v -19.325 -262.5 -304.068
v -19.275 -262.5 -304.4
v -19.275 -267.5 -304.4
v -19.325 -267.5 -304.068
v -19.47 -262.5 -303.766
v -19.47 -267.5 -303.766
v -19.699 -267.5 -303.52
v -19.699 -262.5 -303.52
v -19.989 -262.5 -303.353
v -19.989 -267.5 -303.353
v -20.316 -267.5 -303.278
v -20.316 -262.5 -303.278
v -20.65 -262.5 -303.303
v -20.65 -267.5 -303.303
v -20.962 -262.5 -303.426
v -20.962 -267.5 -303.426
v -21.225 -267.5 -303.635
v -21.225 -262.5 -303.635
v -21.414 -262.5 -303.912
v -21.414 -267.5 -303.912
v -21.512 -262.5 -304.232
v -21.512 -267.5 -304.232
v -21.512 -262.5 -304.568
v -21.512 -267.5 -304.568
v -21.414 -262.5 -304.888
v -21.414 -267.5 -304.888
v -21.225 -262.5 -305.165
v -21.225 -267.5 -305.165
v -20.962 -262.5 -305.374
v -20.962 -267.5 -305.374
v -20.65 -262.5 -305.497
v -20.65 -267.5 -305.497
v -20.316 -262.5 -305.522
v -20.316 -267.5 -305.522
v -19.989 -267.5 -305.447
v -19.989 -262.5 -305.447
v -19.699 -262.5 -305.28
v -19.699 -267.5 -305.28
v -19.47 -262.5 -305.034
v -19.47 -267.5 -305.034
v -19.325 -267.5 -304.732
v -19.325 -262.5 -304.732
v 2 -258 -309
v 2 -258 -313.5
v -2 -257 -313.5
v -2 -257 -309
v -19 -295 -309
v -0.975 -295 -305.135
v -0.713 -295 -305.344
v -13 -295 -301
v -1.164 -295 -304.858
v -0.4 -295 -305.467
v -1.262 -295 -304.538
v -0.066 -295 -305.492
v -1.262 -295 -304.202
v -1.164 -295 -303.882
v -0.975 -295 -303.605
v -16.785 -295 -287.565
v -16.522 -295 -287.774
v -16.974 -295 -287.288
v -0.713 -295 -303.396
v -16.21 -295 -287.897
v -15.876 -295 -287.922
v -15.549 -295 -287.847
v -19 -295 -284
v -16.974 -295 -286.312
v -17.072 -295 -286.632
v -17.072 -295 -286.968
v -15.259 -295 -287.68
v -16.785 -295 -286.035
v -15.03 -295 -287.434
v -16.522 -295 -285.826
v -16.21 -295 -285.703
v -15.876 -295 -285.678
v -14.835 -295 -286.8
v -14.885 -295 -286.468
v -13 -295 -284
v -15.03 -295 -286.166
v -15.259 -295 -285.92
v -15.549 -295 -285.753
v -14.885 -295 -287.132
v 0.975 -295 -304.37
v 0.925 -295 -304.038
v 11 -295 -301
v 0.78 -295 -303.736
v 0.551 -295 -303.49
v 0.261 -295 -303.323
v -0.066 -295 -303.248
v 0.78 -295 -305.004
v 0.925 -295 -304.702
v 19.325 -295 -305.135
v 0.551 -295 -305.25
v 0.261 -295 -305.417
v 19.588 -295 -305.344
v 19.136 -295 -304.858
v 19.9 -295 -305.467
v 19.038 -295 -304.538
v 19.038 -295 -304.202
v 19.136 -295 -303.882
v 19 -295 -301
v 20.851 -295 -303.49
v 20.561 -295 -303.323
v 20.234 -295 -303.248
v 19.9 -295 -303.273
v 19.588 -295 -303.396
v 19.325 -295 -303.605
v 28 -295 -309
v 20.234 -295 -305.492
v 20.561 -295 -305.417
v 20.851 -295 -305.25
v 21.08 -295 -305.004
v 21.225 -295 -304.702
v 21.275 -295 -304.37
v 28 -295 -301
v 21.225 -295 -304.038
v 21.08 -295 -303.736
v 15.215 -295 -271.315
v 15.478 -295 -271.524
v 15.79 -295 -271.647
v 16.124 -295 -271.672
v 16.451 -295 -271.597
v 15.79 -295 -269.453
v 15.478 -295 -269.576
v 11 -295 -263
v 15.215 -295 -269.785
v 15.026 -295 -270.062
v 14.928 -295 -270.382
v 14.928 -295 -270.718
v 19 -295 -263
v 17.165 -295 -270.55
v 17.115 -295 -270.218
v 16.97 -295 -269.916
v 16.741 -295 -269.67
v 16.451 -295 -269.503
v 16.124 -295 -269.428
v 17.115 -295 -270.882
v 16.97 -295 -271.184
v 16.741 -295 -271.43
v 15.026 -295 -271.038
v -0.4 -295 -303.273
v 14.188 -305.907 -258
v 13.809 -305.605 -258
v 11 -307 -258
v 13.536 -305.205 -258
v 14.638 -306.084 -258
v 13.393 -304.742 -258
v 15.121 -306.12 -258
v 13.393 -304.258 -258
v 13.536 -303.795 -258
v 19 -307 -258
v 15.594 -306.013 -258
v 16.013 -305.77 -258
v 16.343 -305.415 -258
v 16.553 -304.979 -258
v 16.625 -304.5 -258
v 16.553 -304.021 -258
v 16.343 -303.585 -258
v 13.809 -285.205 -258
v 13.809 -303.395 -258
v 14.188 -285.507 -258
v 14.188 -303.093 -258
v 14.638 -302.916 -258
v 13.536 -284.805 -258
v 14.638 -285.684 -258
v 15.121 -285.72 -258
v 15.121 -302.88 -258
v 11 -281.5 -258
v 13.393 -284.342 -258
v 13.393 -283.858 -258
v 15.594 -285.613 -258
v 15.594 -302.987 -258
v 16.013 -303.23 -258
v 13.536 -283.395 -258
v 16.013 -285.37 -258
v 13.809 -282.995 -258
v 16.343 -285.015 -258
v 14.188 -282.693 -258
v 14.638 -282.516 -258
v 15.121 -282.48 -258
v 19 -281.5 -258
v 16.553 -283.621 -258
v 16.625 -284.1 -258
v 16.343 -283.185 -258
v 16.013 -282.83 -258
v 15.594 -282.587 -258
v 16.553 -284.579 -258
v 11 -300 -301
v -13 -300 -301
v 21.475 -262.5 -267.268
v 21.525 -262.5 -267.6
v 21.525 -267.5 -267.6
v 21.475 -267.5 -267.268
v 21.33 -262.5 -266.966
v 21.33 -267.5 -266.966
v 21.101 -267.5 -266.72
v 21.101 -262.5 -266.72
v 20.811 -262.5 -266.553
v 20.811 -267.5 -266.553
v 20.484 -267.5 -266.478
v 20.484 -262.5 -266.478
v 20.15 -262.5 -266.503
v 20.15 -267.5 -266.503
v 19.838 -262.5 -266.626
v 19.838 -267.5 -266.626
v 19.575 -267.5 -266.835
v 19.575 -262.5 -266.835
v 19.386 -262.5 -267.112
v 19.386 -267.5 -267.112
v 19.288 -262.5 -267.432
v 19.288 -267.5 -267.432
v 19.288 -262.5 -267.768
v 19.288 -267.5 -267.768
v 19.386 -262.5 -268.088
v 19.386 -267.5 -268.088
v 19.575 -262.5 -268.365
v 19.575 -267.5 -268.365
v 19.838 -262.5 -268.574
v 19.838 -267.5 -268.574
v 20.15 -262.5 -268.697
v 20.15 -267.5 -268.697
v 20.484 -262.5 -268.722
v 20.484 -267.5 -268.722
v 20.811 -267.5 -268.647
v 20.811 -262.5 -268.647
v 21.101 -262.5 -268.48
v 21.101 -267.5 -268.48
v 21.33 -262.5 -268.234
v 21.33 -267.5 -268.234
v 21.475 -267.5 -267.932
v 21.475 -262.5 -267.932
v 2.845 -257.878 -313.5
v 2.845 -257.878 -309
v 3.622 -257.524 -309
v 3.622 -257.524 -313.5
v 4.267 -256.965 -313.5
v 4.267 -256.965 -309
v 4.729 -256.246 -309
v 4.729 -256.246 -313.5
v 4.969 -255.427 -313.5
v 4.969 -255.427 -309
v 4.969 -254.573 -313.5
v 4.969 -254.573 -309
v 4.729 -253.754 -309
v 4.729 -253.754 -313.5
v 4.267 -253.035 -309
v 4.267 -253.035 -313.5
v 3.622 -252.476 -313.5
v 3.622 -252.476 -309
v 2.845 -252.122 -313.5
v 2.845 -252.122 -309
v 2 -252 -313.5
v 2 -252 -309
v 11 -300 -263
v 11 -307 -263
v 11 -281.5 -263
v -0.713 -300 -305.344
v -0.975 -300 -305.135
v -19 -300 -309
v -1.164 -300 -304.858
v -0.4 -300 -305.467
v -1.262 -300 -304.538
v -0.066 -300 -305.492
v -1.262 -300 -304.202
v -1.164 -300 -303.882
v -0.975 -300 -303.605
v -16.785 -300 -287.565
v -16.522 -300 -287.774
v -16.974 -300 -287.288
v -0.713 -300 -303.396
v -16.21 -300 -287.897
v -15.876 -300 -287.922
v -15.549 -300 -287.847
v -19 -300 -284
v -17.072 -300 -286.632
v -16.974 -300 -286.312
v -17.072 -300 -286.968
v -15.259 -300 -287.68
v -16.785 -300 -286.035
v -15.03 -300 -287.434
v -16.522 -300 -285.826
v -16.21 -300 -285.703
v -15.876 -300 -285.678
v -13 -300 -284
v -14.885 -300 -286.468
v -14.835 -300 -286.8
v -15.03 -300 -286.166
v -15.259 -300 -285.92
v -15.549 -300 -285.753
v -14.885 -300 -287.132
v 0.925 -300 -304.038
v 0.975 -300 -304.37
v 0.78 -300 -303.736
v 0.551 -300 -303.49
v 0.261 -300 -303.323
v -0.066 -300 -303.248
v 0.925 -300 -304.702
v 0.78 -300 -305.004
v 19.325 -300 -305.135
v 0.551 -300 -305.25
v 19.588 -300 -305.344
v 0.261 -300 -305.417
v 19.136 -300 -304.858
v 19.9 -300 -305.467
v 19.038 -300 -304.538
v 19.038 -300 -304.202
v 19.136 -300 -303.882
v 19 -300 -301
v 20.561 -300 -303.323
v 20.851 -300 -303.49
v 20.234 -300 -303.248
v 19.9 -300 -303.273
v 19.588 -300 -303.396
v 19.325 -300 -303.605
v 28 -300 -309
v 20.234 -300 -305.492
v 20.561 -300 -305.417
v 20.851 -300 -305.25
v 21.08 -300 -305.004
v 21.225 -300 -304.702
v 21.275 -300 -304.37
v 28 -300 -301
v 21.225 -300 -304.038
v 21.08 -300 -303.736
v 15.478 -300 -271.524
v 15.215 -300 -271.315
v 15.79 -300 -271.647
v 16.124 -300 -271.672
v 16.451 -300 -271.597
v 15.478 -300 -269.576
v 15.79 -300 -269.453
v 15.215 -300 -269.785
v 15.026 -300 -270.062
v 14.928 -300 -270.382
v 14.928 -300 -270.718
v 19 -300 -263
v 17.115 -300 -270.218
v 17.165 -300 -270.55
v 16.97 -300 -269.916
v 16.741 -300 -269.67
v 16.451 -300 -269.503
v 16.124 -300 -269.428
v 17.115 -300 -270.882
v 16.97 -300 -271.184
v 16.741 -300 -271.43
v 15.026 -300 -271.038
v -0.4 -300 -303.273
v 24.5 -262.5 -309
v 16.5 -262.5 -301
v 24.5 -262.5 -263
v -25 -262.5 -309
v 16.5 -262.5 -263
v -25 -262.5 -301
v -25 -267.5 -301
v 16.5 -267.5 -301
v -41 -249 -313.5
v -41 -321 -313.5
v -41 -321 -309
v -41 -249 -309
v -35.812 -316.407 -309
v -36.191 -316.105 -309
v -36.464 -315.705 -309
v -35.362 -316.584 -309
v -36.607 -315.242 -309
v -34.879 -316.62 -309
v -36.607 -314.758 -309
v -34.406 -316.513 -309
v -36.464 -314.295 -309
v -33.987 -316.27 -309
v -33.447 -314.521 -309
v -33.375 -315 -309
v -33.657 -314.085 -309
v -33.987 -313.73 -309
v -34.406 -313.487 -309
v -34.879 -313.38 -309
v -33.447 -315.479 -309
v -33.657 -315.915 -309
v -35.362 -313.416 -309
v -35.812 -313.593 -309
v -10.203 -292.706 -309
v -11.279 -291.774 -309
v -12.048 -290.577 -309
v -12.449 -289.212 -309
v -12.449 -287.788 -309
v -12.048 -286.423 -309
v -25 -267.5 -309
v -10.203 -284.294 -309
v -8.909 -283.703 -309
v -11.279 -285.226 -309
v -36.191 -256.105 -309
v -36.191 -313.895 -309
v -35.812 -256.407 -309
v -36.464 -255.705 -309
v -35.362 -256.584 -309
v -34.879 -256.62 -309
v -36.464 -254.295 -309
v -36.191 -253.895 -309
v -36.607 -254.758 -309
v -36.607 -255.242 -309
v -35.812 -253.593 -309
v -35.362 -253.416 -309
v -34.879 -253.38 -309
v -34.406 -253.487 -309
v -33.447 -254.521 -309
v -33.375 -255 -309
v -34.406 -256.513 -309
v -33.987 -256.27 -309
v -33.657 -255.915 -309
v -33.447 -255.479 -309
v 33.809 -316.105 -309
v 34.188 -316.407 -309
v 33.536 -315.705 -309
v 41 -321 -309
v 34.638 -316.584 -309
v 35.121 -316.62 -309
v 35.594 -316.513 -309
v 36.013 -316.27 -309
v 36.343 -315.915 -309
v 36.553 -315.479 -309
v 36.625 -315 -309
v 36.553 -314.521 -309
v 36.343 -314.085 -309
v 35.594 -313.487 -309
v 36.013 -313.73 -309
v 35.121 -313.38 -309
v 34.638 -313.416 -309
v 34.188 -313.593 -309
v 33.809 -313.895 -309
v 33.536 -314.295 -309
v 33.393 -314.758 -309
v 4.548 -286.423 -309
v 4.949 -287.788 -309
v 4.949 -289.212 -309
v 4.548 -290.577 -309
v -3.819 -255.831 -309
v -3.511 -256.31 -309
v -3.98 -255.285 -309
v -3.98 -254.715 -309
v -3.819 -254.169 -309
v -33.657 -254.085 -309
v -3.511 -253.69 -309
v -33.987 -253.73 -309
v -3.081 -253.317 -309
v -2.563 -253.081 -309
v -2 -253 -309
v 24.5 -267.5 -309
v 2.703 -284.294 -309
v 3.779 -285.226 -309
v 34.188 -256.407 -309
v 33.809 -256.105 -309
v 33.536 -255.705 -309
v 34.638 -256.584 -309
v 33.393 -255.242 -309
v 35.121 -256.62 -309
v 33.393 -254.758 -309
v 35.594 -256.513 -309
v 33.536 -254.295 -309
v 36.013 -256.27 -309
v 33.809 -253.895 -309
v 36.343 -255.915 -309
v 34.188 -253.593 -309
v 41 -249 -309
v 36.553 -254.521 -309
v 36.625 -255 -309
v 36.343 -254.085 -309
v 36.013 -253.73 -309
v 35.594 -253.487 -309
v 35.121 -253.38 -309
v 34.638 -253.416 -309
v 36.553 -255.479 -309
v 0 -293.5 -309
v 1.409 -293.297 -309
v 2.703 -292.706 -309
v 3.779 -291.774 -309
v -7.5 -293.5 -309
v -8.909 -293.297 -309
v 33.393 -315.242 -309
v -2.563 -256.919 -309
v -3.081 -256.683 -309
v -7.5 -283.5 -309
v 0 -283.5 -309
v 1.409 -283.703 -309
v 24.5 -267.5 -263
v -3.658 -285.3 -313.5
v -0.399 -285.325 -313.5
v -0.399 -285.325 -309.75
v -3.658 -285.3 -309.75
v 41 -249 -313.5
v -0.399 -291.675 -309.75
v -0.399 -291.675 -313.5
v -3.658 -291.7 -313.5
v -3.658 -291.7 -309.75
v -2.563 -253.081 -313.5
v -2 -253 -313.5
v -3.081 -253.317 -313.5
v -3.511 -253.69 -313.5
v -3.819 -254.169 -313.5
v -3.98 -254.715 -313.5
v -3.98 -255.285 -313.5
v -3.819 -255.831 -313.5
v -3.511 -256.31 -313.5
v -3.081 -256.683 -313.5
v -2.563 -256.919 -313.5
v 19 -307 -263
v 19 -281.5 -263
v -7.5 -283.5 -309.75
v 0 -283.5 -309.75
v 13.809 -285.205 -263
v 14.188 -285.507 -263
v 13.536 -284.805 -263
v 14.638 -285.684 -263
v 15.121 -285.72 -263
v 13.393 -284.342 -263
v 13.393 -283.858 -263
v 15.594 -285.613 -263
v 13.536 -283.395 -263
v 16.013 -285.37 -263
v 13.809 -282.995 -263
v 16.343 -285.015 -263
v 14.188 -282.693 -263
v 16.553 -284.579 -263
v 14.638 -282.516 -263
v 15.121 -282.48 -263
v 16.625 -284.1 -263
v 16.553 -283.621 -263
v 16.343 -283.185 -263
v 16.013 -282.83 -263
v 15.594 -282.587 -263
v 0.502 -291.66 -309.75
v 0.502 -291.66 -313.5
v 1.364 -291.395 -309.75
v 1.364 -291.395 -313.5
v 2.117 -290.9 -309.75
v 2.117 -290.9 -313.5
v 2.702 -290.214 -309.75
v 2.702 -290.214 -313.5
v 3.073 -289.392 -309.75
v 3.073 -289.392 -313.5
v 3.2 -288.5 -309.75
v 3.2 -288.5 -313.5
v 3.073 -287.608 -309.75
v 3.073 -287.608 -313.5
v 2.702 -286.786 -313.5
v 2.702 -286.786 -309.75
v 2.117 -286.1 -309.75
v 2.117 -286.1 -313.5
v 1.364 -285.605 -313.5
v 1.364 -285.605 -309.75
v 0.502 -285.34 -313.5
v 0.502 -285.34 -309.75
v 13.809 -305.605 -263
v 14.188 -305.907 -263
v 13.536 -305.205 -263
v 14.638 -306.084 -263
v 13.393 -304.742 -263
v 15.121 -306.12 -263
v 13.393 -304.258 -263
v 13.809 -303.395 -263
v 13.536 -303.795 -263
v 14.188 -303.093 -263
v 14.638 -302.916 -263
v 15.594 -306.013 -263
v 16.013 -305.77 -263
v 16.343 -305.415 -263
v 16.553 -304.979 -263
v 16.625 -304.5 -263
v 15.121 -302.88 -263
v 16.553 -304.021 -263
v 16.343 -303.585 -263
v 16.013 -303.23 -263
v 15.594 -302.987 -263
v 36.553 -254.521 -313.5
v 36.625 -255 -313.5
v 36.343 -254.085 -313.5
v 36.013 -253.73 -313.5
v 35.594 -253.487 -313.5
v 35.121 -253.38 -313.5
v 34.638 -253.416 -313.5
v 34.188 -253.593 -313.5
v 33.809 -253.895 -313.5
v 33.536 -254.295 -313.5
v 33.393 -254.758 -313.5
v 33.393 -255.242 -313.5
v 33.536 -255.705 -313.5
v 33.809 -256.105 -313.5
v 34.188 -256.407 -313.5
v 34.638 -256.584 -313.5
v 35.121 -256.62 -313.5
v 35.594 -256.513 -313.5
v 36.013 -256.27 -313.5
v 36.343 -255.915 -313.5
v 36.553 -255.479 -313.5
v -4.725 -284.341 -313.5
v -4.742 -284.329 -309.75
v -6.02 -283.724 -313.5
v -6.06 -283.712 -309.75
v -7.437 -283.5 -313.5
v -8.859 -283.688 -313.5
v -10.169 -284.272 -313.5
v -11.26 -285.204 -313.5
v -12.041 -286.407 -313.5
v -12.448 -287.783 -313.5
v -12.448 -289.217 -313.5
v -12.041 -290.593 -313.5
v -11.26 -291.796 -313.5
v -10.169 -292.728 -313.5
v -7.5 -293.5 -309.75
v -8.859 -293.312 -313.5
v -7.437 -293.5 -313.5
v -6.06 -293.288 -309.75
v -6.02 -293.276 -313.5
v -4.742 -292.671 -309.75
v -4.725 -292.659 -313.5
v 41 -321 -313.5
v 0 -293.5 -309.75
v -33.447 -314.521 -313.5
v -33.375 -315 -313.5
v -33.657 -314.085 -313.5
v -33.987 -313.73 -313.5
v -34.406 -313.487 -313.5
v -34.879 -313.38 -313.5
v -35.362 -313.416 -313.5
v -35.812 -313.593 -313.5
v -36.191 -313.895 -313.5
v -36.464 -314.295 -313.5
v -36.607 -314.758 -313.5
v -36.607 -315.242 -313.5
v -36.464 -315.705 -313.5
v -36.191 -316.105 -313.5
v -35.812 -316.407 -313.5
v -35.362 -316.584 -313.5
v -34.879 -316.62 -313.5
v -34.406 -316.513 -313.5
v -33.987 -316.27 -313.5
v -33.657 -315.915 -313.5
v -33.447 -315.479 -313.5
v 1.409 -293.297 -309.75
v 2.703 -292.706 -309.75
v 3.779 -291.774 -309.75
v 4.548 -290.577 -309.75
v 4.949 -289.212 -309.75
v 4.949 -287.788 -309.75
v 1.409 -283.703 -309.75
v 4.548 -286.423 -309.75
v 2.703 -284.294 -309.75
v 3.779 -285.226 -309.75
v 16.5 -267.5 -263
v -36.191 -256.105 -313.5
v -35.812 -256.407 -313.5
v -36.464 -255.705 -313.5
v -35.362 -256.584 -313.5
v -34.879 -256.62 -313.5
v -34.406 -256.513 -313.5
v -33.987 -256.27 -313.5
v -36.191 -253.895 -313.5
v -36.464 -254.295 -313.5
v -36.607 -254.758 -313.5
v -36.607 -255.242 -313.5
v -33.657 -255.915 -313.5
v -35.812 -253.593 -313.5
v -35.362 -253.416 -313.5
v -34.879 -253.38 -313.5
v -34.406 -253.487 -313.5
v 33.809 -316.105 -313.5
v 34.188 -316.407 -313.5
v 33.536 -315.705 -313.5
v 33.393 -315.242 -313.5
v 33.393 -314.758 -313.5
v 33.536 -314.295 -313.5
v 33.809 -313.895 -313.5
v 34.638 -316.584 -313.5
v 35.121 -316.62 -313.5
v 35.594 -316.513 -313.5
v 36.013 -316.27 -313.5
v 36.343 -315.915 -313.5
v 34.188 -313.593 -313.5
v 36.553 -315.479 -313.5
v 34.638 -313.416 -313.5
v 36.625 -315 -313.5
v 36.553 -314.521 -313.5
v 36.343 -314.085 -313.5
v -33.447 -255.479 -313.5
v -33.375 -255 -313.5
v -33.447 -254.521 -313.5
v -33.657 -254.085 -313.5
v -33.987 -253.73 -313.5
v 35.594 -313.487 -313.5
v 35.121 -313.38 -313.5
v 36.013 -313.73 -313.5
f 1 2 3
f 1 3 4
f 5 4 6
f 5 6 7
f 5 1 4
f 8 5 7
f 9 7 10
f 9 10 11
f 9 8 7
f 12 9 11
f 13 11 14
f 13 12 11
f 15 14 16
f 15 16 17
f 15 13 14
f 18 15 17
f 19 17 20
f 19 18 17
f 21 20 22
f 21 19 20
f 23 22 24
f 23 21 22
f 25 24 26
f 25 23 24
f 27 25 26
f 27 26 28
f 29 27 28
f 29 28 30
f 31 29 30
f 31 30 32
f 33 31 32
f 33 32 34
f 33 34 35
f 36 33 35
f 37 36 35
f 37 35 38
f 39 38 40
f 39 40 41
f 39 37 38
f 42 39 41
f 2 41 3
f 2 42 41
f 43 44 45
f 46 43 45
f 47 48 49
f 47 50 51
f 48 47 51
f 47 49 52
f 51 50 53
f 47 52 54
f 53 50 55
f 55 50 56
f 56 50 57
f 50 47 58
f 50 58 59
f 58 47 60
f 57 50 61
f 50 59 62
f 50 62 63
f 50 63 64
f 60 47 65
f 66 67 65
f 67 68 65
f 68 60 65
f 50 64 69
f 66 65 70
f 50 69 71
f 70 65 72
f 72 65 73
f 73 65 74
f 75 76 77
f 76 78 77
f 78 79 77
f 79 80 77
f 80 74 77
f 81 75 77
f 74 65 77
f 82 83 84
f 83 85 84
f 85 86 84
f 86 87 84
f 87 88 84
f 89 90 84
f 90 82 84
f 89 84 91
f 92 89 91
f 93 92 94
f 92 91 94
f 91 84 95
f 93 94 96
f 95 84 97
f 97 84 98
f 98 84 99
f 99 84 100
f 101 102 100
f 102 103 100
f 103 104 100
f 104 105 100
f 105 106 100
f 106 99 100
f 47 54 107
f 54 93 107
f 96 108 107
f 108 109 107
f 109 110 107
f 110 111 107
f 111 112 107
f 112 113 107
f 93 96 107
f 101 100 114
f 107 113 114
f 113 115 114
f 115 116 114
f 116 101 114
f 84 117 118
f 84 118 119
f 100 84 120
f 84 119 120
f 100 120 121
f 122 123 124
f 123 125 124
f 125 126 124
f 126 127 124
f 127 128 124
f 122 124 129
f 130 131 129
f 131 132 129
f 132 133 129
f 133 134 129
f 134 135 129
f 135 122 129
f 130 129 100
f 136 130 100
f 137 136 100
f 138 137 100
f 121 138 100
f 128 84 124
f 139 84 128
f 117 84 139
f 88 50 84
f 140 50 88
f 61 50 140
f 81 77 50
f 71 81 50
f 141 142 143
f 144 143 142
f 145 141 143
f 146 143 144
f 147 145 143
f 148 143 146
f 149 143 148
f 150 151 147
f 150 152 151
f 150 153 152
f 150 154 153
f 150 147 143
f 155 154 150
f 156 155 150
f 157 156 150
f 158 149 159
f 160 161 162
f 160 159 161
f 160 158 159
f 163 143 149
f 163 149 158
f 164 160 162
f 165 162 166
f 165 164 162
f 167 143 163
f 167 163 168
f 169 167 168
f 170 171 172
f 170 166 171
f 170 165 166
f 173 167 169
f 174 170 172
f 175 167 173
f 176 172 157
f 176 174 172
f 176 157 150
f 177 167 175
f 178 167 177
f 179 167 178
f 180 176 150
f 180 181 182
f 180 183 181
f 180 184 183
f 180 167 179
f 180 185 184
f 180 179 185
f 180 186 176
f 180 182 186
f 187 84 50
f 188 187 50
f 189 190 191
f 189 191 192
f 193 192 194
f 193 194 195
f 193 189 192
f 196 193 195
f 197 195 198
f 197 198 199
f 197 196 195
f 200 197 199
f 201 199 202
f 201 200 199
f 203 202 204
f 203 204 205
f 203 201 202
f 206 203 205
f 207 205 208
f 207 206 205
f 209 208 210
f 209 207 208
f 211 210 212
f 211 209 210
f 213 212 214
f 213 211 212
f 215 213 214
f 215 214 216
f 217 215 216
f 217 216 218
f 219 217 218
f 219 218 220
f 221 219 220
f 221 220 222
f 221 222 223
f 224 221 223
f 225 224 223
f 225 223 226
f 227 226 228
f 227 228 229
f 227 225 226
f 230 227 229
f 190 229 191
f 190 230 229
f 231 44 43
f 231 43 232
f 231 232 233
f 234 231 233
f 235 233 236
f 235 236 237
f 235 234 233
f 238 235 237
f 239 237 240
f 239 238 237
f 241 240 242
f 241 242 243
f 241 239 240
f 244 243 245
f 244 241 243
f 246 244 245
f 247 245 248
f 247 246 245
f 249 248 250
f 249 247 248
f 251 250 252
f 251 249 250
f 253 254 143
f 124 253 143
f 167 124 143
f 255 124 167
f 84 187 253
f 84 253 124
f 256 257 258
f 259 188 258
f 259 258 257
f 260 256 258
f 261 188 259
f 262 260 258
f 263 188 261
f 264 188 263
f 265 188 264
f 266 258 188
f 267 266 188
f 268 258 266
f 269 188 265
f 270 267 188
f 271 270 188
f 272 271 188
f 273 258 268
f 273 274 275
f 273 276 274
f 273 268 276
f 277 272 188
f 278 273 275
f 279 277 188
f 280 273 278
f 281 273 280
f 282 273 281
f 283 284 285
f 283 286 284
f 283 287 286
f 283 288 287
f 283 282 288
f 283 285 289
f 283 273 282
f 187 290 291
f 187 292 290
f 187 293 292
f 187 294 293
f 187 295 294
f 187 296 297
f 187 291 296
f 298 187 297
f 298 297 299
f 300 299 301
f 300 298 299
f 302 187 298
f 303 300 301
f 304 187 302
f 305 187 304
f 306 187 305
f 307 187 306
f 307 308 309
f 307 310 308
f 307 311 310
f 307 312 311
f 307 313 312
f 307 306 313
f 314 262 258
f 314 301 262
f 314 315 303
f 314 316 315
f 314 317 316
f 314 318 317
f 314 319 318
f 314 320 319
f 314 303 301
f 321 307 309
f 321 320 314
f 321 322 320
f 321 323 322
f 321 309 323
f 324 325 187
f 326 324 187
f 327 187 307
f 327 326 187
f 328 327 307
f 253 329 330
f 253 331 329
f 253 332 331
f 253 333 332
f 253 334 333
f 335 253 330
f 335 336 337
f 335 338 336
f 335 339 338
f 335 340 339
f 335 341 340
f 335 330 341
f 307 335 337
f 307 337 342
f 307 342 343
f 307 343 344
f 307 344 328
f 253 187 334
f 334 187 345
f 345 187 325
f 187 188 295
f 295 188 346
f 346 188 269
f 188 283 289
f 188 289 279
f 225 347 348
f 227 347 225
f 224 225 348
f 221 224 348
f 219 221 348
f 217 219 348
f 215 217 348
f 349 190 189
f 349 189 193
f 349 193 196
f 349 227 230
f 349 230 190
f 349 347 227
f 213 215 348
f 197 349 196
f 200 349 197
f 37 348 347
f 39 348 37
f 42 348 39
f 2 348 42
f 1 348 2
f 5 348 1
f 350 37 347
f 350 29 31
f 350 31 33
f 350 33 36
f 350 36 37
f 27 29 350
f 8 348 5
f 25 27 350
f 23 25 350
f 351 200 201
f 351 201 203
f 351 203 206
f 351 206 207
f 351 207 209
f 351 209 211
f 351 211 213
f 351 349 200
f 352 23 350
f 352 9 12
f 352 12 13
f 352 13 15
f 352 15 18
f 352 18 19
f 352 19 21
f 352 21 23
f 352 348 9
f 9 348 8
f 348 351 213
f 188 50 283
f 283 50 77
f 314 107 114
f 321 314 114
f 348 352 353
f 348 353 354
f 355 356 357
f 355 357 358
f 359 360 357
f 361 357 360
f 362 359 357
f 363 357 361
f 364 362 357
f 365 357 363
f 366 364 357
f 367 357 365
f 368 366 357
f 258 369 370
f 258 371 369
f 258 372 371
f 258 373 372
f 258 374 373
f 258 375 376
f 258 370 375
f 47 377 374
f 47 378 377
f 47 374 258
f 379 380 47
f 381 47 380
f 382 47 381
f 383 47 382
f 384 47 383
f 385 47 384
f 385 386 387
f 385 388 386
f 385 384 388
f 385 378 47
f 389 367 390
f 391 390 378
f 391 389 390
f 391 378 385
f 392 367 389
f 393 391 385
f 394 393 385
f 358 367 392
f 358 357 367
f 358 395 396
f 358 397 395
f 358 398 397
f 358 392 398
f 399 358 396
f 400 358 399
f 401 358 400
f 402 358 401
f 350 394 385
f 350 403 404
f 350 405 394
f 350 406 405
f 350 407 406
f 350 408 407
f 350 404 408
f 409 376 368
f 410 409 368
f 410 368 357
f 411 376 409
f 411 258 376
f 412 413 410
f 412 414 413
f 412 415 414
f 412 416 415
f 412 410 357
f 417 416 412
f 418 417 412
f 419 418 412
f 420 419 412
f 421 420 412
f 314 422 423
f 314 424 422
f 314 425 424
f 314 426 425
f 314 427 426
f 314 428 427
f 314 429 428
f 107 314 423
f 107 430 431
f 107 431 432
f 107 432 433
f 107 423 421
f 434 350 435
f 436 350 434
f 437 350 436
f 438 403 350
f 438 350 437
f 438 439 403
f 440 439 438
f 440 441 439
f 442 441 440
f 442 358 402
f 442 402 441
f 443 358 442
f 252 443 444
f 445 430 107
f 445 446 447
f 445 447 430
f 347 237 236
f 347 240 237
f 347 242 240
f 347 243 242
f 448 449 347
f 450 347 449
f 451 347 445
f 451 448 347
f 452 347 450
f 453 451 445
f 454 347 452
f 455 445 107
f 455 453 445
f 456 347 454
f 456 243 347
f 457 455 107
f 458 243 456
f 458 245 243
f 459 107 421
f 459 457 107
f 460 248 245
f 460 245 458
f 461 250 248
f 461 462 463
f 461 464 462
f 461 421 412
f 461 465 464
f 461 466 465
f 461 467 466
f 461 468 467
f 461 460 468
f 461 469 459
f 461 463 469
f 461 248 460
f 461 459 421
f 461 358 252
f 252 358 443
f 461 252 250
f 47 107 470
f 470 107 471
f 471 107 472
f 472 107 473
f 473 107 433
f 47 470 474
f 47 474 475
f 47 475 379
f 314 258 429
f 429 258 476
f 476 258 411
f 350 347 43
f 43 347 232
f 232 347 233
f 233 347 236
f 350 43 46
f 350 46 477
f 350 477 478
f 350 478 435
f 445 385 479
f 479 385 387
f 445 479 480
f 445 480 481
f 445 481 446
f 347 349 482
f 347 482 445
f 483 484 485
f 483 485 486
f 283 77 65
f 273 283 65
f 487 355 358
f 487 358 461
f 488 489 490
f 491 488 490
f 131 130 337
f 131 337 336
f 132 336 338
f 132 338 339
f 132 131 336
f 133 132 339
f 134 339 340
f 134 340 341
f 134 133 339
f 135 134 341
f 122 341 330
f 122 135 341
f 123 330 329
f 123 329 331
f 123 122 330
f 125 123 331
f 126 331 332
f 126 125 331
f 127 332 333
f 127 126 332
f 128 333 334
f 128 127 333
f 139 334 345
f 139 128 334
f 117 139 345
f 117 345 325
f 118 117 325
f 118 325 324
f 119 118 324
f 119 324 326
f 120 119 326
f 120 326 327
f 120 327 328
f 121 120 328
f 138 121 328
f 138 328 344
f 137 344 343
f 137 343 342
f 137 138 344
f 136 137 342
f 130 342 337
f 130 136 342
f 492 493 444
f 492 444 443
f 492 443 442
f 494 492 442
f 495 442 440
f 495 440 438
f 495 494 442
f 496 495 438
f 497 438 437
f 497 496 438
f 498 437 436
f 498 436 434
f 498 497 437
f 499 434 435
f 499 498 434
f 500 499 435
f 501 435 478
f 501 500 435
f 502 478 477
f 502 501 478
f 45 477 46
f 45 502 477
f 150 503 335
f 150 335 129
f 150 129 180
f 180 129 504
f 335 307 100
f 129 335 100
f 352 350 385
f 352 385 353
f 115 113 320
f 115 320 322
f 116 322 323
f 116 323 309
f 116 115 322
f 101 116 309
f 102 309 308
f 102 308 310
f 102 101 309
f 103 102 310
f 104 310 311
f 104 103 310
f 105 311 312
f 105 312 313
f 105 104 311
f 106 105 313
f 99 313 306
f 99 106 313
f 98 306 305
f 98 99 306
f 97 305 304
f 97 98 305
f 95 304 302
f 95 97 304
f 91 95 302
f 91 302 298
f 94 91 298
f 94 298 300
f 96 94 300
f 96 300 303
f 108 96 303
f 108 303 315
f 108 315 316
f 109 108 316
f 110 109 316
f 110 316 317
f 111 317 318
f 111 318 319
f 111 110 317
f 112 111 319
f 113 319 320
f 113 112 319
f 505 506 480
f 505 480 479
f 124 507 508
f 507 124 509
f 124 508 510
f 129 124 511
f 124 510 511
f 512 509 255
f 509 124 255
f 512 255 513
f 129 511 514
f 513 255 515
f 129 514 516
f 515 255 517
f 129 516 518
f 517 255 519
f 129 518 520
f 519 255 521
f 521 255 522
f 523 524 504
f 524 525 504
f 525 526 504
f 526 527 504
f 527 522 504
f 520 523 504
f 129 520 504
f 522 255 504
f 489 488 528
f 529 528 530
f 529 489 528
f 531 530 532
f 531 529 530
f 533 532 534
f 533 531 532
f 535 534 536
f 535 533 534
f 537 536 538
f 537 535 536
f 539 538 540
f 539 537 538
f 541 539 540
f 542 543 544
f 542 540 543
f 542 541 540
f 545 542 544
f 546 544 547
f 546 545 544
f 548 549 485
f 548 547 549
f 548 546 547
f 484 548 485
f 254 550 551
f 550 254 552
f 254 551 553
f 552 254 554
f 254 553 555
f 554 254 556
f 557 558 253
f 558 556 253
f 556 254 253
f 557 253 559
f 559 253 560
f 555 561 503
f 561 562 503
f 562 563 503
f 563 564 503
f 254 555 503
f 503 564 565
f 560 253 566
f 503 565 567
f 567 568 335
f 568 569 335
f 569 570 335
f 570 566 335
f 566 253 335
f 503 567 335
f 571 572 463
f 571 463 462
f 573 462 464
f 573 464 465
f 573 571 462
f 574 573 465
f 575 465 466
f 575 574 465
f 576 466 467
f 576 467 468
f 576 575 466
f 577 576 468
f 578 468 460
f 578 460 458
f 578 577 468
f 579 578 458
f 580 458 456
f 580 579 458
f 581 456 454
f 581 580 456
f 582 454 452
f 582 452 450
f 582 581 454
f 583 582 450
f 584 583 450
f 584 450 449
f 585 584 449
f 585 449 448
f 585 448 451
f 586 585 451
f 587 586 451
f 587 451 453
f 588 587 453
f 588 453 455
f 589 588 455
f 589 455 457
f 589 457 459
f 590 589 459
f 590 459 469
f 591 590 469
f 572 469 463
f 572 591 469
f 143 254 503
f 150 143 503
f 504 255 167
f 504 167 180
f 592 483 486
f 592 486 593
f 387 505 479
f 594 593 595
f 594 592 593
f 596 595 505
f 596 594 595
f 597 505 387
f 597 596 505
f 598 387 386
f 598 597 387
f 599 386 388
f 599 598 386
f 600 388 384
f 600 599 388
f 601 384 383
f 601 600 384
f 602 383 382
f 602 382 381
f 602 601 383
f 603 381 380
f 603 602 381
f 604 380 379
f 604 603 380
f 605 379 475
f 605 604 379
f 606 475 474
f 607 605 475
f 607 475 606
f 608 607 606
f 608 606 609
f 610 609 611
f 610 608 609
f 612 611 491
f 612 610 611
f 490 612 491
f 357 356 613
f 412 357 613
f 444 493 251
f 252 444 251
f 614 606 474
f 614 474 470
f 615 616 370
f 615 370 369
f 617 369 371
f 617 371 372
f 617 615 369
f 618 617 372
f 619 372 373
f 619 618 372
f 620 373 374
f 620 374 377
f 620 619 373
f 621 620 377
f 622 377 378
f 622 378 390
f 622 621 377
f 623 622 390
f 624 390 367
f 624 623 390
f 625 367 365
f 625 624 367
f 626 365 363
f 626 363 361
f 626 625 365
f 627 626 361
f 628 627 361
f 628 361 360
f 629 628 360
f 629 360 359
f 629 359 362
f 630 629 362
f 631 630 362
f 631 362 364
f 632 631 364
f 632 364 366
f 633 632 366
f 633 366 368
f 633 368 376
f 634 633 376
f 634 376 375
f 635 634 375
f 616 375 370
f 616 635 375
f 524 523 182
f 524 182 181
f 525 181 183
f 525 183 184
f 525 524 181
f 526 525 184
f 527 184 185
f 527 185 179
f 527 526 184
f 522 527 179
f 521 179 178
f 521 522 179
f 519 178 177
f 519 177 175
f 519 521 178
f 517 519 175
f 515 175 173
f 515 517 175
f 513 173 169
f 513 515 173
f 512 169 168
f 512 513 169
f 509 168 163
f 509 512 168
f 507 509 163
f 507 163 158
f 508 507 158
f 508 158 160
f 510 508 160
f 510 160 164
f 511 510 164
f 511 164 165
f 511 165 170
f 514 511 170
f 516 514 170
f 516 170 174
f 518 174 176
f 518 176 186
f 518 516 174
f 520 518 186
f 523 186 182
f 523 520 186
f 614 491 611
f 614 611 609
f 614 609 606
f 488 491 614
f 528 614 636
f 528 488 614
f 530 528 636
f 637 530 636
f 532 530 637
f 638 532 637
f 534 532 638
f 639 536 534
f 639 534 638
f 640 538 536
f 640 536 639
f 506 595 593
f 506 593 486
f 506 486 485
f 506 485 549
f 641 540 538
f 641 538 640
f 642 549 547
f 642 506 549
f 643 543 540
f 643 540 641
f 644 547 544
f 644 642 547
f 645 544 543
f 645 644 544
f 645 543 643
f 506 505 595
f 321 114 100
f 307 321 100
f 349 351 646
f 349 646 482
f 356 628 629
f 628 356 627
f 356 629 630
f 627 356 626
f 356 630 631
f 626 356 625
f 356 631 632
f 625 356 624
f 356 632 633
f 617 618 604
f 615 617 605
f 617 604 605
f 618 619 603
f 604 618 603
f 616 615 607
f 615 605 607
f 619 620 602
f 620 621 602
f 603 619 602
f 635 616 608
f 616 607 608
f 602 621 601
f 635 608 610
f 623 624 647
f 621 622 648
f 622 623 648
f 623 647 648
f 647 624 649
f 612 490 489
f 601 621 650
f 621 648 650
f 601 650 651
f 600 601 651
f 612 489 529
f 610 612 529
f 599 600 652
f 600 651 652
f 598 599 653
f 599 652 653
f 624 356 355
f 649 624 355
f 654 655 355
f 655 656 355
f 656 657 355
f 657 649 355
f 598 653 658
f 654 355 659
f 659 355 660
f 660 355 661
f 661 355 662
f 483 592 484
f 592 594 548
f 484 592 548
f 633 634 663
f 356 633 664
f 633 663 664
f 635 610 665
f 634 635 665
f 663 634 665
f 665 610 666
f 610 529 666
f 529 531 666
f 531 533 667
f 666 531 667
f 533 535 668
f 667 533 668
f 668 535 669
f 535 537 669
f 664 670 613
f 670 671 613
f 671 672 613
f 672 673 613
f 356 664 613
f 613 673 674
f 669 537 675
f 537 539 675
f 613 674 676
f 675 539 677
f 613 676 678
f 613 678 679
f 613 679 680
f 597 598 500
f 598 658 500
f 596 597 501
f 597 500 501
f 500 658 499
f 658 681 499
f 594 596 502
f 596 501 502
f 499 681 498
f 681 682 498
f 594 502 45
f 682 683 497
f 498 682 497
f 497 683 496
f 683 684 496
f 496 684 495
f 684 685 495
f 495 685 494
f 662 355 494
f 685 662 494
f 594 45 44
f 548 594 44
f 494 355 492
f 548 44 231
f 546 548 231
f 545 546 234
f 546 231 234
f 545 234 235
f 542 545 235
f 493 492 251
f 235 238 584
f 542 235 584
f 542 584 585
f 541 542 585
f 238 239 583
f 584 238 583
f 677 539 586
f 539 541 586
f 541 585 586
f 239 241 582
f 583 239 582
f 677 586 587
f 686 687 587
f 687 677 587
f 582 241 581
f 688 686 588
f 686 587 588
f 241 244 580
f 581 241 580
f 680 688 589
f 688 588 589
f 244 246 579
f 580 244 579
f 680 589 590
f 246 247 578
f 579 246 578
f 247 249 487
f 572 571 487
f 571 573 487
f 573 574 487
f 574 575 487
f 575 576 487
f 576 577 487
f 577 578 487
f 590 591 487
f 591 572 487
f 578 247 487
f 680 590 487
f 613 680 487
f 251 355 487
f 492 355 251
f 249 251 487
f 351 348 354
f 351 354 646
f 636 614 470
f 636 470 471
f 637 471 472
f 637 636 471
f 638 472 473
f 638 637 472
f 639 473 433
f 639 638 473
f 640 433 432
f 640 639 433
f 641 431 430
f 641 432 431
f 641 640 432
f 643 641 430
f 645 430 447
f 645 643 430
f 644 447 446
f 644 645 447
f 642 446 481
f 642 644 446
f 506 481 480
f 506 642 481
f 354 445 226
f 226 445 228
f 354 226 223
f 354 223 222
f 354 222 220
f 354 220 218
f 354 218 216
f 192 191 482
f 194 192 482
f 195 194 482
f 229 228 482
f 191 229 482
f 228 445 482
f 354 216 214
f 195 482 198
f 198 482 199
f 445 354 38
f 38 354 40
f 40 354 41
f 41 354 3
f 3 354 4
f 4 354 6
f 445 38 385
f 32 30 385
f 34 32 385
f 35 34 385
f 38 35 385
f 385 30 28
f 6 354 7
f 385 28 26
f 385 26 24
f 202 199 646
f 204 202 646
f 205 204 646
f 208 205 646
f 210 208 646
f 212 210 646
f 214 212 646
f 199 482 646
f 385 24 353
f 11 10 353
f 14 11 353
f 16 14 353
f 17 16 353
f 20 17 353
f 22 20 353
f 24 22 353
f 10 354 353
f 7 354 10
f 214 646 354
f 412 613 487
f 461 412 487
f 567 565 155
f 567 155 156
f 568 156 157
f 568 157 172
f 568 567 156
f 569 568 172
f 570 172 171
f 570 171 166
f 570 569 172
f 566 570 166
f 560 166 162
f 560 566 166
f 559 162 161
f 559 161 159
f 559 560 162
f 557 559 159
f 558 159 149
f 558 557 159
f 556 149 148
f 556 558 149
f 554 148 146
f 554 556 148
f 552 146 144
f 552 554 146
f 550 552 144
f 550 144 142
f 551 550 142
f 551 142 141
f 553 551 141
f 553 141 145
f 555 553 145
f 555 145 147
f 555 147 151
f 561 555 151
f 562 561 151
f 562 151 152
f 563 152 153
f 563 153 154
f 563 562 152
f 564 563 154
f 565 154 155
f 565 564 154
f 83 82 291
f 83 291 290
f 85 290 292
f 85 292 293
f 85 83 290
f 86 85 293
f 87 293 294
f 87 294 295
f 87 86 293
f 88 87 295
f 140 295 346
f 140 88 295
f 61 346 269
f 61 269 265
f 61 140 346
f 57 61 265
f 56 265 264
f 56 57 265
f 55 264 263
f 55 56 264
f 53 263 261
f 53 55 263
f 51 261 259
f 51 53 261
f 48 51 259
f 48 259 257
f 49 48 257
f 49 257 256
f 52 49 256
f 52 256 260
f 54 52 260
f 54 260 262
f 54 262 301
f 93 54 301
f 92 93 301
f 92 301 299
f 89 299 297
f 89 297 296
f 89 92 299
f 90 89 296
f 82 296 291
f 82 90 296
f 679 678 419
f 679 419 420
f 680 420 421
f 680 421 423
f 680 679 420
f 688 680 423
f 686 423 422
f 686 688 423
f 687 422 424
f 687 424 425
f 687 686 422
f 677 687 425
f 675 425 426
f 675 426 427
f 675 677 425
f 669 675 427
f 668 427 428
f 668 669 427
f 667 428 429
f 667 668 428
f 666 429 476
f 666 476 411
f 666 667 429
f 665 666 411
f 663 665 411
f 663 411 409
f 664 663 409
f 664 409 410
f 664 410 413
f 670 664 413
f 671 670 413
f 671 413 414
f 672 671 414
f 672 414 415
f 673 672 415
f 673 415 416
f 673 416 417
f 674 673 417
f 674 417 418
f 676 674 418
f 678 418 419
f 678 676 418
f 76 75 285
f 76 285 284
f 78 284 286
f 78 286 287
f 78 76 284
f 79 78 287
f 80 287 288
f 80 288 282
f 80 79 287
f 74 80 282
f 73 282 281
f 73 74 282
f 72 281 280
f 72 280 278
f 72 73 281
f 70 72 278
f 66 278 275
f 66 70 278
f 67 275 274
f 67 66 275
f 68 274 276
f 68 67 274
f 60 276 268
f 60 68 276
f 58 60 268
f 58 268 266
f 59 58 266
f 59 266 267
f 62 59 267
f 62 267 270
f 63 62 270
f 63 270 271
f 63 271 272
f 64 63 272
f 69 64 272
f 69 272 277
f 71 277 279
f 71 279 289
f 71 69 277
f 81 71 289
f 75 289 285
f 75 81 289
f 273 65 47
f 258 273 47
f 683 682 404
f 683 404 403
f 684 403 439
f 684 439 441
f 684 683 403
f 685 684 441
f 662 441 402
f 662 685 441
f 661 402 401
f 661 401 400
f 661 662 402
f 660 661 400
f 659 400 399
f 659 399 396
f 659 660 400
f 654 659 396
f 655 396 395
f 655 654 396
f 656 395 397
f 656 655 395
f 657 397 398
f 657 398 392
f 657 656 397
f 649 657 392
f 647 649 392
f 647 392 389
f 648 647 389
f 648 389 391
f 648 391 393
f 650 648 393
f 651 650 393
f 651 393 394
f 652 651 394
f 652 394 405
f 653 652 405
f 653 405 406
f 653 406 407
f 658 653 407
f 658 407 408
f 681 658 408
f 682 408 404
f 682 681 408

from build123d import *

# Parameters (mm, degrees)
EXTRUDE031_DEPTH = 5
SKETCH021_R      = 1.125
EXTRUDE005_DEPTH = 5
SKETCH020_W      = 8
SKETCH020_H      = 25.5
SKETCH020_R      = 1.625
EXTRUDE004_DEPTH = 5
SKETCH019_R      = 1.125
EXTRUDE003_DEPTH = 5
SKETCH093_W      = 82
SKETCH093_H      = 72
SKETCH093_R      = 1.625
EXTRUDE030_DEPTH = 4.5


with BuildPart() as basemiccut:
    # Sketch094 → Extrude031 (new body)
    with BuildSketch(Plane.XY):
        with BuildLine():
            ThreePointArc((-7.5, -283.5), (-12.5, -288.5), (-7.5, -293.5))
            Line((-7.5, -293.5), (0, -293.5))
            ThreePointArc((0, -293.5), (5, -288.5), (0, -283.5))
            Line((0, -283.5), (-7.5, -283.5))
        make_face()
    extrude(amount=EXTRUDE031_DEPTH)


with BuildPart() as basemiccut_1:
    # Extrude031 placement: moved
    add(basemiccut.part.moved(Location((0, 0, -309.75))))


with BuildPart() as ipshold:
    # Sketch021 (on Extrude) → Extrude005 (new body)
    with BuildSketch(Plane.XZ):
        Polygon((-25, -309), (-25, -301), (16.5, -301), (16.5, -263), (24.5, -263), (24.5, -309), align=None)
        with Locations((-20.4, -304.4)):
            Circle(SKETCH021_R, mode=Mode.SUBTRACT)
        with Locations((20.4, -267.6)):
            Circle(SKETCH021_R, mode=Mode.SUBTRACT)
    extrude(amount=EXTRUDE005_DEPTH)


with BuildPart() as ipshold_1:
    # Extrude005 placement: moved
    add(ipshold.part.moved(Location((0, -262.5, 0))))


with BuildPart() as gpshold:
    # Sketch020 → Extrude004 (new body)
    with BuildSketch(Plane.XY.offset(-263)):
        with Locations((15, -294.25)):
            Rectangle(SKETCH020_W, SKETCH020_H)
        with Locations((15, -284.1)):
            Circle(SKETCH020_R, mode=Mode.SUBTRACT)
        with Locations((15, -304.5)):
            Circle(SKETCH020_R, mode=Mode.SUBTRACT)
    extrude(amount=EXTRUDE004_DEPTH)


with BuildPart() as i2chold:
    # Sketch019 → Extrude003 (new body)
    with BuildSketch(Plane.XZ.offset(295)):
        Polygon((28, -309), (28, -301), (19, -301), (19, -263), (11, -263), (11, -301), (-13, -301), (-13, -284), (-19, -284), (-19, -309), align=None)
        with Locations((-15.96, -286.8)):
            Circle(SKETCH019_R, mode=Mode.SUBTRACT)
        with Locations((-0.15, -304.37)):
            Circle(SKETCH019_R, mode=Mode.SUBTRACT)
        with Locations((20.15, -304.37)):
            Circle(SKETCH019_R, mode=Mode.SUBTRACT)
        with Locations((16.04, -270.55)):
            Circle(SKETCH019_R, mode=Mode.SUBTRACT)
    extrude(amount=EXTRUDE003_DEPTH)


with BuildPart() as base012:
    # Sketch093 → Extrude030 (new body)
    with BuildSketch(Plane.XY):
        with Locations((0, -285)):
            Rectangle(SKETCH093_W, SKETCH093_H)
        with Locations((-35, -315)):
            Circle(SKETCH093_R, mode=Mode.SUBTRACT)
        with Locations((35, -315)):
            Circle(SKETCH093_R, mode=Mode.SUBTRACT)
        with Locations((35, -255)):
            Circle(SKETCH093_R, mode=Mode.SUBTRACT)
        with Locations((-35, -255)):
            Circle(SKETCH093_R, mode=Mode.SUBTRACT)
        with BuildLine():
            ThreePointArc((-3.658125, -285.3), (-12.5, -288.5), (-3.658125, -291.7))
            Line((-0.399218, -291.675), (-3.658125, -291.7))
            ThreePointArc((-0.399218, -291.675), (3.2, -288.5), (-0.399218, -285.325))
            Line((-0.399218, -285.325), (-3.658125, -285.3))
        make_face(mode=Mode.SUBTRACT)
        with BuildLine():
            ThreePointArc((-2, -253), (-4, -255), (-2, -257))
            Line((2, -258), (-2, -257))
            ThreePointArc((2, -258), (5, -255), (2, -252))
            Line((-2, -253), (2, -252))
        make_face(mode=Mode.SUBTRACT)
    extrude(amount=EXTRUDE030_DEPTH)


with BuildPart() as base012_1:
    # Extrude030 placement: moved
    add(base012.part.moved(Location((0, 0, -313.5))))

    # Fusion078: union ipsHold, gpsHold, i2cHold
    add(ipshold_1.part)
    add(gpshold.part)
    add(i2chold.part)

    # Cut035: cut baseMicCut
    add(basemiccut_1.part, mode=Mode.SUBTRACT)


solid = base012_1.part
